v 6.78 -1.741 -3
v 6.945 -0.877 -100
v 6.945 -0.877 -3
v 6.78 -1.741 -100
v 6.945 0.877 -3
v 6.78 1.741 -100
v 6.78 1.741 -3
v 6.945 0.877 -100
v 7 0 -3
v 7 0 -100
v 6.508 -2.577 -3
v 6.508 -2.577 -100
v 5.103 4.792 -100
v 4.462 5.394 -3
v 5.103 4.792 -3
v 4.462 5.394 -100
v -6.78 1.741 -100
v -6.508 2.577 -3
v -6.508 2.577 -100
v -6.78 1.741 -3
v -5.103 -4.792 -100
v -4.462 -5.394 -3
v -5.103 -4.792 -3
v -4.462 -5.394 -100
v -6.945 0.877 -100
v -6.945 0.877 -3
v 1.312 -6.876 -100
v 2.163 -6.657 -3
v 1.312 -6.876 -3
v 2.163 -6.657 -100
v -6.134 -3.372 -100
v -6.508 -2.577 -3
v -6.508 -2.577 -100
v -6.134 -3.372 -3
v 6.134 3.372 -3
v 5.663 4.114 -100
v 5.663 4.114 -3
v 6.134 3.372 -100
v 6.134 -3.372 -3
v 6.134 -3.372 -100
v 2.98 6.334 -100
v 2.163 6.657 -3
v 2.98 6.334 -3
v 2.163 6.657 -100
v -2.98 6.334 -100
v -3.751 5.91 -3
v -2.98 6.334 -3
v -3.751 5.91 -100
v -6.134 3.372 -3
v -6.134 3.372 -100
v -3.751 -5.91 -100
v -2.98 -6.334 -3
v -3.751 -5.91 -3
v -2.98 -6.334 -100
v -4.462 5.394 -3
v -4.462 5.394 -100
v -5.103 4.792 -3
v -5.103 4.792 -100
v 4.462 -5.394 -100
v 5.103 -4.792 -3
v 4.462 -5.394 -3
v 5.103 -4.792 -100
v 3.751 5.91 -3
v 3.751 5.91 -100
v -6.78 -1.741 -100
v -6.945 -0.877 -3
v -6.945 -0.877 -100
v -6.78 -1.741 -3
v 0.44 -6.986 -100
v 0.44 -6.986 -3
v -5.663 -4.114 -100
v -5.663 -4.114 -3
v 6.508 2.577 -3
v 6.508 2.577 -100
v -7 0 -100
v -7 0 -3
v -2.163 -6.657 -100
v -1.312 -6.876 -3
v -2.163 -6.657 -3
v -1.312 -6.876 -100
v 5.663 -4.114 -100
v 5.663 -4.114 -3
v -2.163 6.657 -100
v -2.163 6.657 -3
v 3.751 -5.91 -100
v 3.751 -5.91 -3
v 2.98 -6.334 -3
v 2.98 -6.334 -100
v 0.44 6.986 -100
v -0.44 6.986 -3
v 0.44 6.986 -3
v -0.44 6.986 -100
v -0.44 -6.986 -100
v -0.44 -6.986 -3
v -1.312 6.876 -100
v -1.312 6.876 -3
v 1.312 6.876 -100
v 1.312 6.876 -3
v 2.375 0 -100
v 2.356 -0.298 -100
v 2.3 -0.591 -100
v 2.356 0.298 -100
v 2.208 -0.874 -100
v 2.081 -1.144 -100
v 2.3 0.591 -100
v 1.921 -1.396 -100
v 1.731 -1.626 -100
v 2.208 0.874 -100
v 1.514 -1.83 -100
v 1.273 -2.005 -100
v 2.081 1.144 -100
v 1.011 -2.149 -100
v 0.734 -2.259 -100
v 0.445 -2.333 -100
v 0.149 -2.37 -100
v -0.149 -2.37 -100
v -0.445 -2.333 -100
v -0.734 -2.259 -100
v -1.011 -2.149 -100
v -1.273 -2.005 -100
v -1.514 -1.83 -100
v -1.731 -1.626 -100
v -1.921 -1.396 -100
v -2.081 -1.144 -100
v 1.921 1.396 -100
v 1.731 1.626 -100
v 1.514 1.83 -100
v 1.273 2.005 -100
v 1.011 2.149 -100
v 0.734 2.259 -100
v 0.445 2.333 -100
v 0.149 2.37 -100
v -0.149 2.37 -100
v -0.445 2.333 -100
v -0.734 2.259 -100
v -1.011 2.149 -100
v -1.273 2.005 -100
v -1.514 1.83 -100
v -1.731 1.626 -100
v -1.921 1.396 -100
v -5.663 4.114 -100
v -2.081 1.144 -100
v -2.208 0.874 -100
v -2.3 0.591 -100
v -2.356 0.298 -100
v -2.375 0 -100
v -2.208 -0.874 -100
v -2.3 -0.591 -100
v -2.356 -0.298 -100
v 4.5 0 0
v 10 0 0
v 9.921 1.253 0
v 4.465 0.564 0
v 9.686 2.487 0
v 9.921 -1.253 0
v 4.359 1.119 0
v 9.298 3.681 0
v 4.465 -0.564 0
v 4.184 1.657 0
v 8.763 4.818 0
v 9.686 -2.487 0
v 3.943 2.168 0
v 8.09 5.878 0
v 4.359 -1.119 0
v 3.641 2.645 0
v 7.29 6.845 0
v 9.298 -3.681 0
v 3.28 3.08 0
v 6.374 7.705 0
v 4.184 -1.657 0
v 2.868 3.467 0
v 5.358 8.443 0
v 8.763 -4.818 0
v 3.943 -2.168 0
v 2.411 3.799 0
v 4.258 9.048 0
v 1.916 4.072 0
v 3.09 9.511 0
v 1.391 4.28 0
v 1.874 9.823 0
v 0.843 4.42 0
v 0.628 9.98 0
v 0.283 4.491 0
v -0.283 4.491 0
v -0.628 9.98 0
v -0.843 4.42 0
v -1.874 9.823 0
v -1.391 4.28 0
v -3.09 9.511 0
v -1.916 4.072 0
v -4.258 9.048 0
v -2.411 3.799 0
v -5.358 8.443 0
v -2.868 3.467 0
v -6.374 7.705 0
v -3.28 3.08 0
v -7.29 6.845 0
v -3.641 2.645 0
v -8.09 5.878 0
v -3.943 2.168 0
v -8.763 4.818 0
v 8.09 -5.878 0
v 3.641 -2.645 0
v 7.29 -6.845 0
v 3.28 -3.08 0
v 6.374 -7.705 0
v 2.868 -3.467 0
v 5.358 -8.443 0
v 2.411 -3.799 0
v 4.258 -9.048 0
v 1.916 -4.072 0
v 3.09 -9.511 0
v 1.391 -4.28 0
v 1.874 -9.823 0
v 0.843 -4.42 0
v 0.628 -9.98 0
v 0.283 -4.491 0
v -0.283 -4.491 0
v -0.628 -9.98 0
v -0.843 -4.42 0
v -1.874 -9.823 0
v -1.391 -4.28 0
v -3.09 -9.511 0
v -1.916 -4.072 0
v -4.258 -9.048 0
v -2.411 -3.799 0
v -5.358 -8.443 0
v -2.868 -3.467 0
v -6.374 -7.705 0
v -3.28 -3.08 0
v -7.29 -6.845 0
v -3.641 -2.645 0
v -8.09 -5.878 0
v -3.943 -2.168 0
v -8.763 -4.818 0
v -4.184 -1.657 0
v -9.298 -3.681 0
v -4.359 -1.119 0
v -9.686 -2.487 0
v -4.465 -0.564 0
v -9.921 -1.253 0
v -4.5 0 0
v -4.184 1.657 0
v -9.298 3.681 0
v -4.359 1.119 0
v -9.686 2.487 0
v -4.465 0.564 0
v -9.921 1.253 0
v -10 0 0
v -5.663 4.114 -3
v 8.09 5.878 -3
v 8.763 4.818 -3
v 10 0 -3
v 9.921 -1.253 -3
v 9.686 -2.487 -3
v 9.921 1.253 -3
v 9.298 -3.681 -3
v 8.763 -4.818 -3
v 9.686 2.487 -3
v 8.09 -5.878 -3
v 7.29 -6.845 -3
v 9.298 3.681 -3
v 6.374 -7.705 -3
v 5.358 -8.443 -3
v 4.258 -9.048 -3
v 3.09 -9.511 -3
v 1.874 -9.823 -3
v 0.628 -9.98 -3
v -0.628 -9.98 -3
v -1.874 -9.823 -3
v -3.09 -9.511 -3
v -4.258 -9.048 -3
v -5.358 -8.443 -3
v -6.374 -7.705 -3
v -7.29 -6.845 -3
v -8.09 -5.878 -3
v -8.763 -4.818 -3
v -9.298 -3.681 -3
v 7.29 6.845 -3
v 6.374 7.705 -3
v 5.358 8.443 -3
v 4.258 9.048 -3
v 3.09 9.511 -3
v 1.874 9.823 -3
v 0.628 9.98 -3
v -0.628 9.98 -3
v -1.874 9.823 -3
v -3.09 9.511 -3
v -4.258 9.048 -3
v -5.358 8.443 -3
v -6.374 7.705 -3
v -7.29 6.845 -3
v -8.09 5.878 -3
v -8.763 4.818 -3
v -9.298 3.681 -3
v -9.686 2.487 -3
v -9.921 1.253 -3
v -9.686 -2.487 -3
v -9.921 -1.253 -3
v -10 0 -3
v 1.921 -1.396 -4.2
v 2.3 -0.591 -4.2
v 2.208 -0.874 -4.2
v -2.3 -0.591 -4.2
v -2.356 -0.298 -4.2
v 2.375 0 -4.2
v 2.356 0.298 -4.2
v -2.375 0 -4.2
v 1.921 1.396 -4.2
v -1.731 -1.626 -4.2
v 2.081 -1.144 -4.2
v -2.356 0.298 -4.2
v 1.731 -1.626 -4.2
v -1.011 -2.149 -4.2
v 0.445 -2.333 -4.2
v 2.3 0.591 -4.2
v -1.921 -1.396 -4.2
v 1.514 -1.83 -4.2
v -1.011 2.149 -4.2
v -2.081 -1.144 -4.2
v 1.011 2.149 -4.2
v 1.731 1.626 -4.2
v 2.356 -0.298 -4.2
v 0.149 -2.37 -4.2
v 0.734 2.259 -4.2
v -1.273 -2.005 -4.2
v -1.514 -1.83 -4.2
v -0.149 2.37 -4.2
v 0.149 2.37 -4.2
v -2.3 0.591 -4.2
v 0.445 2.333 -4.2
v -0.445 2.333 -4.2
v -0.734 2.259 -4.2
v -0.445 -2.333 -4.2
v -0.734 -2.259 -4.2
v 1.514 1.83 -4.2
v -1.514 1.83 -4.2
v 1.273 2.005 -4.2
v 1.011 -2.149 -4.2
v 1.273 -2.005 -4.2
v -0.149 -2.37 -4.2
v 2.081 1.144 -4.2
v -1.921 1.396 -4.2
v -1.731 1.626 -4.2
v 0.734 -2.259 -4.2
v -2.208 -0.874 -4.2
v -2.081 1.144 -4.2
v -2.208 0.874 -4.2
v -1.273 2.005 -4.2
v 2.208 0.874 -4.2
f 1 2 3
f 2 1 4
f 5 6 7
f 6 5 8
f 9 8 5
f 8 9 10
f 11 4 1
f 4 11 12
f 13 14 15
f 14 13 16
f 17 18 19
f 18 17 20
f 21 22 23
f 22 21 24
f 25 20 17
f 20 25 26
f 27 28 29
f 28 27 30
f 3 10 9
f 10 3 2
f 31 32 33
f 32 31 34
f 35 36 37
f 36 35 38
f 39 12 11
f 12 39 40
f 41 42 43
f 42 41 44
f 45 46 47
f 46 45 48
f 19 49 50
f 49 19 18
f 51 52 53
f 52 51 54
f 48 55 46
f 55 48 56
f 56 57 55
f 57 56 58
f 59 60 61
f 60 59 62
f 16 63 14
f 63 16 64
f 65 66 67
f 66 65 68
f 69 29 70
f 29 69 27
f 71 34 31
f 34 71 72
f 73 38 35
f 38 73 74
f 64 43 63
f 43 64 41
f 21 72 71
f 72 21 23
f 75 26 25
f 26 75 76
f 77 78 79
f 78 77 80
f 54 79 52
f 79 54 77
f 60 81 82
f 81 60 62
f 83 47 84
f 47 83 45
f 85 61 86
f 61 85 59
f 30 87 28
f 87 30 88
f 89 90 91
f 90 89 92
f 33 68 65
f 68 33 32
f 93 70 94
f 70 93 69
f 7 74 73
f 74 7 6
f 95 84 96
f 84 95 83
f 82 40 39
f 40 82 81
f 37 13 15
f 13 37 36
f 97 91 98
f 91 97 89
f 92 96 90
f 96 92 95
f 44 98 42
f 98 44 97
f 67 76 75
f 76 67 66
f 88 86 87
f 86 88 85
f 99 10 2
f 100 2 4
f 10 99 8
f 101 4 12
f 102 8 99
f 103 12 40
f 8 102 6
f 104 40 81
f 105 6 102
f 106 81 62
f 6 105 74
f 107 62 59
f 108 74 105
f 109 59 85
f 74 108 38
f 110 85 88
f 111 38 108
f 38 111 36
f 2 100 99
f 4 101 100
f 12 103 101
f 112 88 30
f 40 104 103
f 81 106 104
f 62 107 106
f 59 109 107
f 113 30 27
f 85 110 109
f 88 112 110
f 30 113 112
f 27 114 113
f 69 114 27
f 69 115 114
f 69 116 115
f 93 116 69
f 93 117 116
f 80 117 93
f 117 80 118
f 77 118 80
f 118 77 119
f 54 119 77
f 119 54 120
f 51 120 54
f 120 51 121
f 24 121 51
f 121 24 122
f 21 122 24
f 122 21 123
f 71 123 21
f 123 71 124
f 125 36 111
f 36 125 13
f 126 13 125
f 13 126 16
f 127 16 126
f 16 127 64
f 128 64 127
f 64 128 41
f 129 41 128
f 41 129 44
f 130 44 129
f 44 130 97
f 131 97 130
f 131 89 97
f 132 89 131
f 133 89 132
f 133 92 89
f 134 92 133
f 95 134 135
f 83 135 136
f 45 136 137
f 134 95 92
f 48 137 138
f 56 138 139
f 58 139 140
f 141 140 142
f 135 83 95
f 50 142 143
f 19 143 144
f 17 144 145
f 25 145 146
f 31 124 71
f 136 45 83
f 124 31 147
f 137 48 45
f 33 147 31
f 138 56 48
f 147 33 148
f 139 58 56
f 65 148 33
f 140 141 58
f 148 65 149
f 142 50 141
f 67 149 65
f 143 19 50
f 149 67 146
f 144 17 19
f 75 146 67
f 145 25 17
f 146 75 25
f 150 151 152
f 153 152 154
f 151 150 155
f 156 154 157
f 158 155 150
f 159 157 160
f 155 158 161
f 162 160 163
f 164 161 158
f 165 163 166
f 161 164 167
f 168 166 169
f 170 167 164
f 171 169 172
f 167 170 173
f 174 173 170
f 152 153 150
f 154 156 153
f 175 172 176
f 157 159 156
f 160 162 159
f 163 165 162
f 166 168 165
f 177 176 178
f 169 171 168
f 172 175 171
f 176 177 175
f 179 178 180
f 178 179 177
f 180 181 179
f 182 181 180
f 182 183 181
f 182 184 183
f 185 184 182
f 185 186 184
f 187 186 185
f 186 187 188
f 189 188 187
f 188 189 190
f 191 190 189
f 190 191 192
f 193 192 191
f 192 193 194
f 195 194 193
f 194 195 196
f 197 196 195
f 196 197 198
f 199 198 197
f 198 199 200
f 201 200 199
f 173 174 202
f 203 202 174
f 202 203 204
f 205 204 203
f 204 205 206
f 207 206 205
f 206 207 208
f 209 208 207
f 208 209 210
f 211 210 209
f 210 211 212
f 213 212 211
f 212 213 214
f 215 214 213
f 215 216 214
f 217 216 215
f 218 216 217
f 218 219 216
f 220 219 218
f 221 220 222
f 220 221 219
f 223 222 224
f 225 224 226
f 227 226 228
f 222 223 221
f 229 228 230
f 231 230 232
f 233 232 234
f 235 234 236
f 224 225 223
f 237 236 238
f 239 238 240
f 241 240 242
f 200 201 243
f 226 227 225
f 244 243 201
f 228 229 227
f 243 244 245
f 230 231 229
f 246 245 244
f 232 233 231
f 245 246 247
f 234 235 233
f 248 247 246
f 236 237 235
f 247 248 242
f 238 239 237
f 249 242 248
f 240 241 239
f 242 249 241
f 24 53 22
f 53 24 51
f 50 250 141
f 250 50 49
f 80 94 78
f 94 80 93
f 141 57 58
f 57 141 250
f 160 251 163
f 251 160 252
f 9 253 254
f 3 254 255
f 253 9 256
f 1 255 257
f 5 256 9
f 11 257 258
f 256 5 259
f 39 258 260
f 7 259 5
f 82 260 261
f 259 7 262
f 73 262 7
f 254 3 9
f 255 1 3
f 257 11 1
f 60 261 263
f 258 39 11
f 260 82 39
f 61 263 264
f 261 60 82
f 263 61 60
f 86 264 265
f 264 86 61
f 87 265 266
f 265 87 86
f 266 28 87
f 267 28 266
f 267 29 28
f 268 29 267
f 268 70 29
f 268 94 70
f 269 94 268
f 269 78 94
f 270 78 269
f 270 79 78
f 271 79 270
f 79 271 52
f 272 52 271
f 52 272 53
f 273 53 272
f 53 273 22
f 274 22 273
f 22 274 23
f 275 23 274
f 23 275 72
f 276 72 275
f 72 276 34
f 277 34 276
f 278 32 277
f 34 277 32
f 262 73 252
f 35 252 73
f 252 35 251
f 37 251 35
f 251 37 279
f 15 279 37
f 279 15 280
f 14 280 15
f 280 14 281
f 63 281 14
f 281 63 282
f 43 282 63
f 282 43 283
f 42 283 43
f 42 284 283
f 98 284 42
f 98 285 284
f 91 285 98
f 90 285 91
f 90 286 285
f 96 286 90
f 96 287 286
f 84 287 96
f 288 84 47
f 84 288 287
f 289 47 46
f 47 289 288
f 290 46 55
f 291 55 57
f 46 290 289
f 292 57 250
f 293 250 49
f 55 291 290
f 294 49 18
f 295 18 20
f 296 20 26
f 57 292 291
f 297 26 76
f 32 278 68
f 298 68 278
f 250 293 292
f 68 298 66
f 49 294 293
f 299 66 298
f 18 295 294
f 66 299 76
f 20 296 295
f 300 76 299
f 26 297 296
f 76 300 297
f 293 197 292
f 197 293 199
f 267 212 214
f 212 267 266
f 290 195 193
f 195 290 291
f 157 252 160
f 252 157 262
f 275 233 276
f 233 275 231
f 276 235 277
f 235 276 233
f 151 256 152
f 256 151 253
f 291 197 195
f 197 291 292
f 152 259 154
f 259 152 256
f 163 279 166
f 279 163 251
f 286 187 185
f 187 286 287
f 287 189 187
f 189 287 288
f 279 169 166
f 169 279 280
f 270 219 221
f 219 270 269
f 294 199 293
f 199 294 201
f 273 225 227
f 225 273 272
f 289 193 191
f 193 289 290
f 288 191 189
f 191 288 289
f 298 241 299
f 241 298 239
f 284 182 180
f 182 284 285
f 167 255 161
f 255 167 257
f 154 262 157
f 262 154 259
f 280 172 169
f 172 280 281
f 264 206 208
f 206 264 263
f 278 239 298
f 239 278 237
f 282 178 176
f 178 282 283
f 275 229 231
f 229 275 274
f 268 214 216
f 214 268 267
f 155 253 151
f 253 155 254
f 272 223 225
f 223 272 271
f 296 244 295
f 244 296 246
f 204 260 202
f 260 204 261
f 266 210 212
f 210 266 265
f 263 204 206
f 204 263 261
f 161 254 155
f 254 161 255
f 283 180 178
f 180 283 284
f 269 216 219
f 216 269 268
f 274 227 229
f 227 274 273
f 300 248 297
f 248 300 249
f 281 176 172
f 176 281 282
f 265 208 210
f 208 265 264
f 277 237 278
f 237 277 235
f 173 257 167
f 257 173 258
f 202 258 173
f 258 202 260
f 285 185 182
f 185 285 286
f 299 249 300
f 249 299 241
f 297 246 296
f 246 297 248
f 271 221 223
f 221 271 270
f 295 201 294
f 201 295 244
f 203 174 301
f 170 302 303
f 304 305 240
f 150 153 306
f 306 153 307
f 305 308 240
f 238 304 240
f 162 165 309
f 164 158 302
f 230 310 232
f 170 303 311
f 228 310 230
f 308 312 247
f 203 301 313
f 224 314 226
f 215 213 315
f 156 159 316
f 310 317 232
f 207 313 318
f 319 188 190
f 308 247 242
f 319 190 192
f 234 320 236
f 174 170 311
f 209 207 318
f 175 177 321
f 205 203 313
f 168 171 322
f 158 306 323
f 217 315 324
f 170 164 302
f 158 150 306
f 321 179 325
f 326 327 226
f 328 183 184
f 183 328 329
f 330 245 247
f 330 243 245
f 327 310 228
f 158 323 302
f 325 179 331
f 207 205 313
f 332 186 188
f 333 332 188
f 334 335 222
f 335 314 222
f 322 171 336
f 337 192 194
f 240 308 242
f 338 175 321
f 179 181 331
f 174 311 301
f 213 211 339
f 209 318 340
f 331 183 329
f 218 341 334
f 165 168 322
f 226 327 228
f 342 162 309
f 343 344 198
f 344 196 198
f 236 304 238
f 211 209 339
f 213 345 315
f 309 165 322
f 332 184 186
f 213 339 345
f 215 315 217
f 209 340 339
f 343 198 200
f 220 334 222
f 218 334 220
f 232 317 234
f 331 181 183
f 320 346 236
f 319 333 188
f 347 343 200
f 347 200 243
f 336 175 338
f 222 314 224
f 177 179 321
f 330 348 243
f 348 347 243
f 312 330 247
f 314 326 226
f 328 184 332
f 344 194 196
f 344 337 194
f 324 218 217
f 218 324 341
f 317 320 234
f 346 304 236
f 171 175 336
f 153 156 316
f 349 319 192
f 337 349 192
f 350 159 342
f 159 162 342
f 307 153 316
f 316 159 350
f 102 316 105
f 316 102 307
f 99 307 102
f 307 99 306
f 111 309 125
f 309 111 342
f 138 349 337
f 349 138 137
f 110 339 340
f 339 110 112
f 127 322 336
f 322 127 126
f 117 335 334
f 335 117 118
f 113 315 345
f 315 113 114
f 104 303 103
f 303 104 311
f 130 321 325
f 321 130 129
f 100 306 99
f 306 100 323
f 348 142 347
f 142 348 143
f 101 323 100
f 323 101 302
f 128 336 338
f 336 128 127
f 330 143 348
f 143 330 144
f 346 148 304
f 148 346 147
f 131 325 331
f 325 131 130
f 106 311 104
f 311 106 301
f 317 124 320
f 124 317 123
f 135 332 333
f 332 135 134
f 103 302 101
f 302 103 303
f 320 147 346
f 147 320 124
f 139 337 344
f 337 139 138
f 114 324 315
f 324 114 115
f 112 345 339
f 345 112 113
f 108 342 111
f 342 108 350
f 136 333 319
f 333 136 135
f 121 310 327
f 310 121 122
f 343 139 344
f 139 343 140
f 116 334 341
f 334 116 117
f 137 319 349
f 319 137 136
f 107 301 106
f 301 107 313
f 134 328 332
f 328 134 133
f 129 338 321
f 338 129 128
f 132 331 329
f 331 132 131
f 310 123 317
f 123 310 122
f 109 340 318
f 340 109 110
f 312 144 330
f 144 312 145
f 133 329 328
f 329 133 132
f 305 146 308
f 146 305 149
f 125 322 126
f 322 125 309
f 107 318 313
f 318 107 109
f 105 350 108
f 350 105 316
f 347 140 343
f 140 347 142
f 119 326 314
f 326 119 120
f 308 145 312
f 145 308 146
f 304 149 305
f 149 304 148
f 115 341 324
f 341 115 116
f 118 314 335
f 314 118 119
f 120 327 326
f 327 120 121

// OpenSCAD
$fn = 50;


difference() {
	union() {
		translate(v = [0, 0, -100.0000000000]) {
			cylinder(h = 100, r = 7.0000000000);
		}
		translate(v = [0, 0, -3.0000000000]) {
			cylinder(h = 3, r = 10.0000000000);
		}
	}
	union() {
		translate(v = [0, 0, 0]) {
			rotate(a = [0, 0, 0]) {
				difference() {
					union() {
						#translate(v = [0, 0, -100.0000000000]) {
							cylinder(h = 100, r = 2.2500000000);
						}
						#translate(v = [0, 0, -4.2000000000]) {
							cylinder(h = 4.2000000000, r = 7.0000000000, r1 = 2.3750000000, r2 = 4.5000000000);
						}
						#translate(v = [0, 0, -100.0000000000]) {
							cylinder(h = 100, r = 2.3750000000);
						}
						#translate(v = [0, 0, -100.0000000000]) {
							cylinder(h = 100, r = 2.2500000000);
						}
					}
					union();
				}
			}
		}
	}
}
